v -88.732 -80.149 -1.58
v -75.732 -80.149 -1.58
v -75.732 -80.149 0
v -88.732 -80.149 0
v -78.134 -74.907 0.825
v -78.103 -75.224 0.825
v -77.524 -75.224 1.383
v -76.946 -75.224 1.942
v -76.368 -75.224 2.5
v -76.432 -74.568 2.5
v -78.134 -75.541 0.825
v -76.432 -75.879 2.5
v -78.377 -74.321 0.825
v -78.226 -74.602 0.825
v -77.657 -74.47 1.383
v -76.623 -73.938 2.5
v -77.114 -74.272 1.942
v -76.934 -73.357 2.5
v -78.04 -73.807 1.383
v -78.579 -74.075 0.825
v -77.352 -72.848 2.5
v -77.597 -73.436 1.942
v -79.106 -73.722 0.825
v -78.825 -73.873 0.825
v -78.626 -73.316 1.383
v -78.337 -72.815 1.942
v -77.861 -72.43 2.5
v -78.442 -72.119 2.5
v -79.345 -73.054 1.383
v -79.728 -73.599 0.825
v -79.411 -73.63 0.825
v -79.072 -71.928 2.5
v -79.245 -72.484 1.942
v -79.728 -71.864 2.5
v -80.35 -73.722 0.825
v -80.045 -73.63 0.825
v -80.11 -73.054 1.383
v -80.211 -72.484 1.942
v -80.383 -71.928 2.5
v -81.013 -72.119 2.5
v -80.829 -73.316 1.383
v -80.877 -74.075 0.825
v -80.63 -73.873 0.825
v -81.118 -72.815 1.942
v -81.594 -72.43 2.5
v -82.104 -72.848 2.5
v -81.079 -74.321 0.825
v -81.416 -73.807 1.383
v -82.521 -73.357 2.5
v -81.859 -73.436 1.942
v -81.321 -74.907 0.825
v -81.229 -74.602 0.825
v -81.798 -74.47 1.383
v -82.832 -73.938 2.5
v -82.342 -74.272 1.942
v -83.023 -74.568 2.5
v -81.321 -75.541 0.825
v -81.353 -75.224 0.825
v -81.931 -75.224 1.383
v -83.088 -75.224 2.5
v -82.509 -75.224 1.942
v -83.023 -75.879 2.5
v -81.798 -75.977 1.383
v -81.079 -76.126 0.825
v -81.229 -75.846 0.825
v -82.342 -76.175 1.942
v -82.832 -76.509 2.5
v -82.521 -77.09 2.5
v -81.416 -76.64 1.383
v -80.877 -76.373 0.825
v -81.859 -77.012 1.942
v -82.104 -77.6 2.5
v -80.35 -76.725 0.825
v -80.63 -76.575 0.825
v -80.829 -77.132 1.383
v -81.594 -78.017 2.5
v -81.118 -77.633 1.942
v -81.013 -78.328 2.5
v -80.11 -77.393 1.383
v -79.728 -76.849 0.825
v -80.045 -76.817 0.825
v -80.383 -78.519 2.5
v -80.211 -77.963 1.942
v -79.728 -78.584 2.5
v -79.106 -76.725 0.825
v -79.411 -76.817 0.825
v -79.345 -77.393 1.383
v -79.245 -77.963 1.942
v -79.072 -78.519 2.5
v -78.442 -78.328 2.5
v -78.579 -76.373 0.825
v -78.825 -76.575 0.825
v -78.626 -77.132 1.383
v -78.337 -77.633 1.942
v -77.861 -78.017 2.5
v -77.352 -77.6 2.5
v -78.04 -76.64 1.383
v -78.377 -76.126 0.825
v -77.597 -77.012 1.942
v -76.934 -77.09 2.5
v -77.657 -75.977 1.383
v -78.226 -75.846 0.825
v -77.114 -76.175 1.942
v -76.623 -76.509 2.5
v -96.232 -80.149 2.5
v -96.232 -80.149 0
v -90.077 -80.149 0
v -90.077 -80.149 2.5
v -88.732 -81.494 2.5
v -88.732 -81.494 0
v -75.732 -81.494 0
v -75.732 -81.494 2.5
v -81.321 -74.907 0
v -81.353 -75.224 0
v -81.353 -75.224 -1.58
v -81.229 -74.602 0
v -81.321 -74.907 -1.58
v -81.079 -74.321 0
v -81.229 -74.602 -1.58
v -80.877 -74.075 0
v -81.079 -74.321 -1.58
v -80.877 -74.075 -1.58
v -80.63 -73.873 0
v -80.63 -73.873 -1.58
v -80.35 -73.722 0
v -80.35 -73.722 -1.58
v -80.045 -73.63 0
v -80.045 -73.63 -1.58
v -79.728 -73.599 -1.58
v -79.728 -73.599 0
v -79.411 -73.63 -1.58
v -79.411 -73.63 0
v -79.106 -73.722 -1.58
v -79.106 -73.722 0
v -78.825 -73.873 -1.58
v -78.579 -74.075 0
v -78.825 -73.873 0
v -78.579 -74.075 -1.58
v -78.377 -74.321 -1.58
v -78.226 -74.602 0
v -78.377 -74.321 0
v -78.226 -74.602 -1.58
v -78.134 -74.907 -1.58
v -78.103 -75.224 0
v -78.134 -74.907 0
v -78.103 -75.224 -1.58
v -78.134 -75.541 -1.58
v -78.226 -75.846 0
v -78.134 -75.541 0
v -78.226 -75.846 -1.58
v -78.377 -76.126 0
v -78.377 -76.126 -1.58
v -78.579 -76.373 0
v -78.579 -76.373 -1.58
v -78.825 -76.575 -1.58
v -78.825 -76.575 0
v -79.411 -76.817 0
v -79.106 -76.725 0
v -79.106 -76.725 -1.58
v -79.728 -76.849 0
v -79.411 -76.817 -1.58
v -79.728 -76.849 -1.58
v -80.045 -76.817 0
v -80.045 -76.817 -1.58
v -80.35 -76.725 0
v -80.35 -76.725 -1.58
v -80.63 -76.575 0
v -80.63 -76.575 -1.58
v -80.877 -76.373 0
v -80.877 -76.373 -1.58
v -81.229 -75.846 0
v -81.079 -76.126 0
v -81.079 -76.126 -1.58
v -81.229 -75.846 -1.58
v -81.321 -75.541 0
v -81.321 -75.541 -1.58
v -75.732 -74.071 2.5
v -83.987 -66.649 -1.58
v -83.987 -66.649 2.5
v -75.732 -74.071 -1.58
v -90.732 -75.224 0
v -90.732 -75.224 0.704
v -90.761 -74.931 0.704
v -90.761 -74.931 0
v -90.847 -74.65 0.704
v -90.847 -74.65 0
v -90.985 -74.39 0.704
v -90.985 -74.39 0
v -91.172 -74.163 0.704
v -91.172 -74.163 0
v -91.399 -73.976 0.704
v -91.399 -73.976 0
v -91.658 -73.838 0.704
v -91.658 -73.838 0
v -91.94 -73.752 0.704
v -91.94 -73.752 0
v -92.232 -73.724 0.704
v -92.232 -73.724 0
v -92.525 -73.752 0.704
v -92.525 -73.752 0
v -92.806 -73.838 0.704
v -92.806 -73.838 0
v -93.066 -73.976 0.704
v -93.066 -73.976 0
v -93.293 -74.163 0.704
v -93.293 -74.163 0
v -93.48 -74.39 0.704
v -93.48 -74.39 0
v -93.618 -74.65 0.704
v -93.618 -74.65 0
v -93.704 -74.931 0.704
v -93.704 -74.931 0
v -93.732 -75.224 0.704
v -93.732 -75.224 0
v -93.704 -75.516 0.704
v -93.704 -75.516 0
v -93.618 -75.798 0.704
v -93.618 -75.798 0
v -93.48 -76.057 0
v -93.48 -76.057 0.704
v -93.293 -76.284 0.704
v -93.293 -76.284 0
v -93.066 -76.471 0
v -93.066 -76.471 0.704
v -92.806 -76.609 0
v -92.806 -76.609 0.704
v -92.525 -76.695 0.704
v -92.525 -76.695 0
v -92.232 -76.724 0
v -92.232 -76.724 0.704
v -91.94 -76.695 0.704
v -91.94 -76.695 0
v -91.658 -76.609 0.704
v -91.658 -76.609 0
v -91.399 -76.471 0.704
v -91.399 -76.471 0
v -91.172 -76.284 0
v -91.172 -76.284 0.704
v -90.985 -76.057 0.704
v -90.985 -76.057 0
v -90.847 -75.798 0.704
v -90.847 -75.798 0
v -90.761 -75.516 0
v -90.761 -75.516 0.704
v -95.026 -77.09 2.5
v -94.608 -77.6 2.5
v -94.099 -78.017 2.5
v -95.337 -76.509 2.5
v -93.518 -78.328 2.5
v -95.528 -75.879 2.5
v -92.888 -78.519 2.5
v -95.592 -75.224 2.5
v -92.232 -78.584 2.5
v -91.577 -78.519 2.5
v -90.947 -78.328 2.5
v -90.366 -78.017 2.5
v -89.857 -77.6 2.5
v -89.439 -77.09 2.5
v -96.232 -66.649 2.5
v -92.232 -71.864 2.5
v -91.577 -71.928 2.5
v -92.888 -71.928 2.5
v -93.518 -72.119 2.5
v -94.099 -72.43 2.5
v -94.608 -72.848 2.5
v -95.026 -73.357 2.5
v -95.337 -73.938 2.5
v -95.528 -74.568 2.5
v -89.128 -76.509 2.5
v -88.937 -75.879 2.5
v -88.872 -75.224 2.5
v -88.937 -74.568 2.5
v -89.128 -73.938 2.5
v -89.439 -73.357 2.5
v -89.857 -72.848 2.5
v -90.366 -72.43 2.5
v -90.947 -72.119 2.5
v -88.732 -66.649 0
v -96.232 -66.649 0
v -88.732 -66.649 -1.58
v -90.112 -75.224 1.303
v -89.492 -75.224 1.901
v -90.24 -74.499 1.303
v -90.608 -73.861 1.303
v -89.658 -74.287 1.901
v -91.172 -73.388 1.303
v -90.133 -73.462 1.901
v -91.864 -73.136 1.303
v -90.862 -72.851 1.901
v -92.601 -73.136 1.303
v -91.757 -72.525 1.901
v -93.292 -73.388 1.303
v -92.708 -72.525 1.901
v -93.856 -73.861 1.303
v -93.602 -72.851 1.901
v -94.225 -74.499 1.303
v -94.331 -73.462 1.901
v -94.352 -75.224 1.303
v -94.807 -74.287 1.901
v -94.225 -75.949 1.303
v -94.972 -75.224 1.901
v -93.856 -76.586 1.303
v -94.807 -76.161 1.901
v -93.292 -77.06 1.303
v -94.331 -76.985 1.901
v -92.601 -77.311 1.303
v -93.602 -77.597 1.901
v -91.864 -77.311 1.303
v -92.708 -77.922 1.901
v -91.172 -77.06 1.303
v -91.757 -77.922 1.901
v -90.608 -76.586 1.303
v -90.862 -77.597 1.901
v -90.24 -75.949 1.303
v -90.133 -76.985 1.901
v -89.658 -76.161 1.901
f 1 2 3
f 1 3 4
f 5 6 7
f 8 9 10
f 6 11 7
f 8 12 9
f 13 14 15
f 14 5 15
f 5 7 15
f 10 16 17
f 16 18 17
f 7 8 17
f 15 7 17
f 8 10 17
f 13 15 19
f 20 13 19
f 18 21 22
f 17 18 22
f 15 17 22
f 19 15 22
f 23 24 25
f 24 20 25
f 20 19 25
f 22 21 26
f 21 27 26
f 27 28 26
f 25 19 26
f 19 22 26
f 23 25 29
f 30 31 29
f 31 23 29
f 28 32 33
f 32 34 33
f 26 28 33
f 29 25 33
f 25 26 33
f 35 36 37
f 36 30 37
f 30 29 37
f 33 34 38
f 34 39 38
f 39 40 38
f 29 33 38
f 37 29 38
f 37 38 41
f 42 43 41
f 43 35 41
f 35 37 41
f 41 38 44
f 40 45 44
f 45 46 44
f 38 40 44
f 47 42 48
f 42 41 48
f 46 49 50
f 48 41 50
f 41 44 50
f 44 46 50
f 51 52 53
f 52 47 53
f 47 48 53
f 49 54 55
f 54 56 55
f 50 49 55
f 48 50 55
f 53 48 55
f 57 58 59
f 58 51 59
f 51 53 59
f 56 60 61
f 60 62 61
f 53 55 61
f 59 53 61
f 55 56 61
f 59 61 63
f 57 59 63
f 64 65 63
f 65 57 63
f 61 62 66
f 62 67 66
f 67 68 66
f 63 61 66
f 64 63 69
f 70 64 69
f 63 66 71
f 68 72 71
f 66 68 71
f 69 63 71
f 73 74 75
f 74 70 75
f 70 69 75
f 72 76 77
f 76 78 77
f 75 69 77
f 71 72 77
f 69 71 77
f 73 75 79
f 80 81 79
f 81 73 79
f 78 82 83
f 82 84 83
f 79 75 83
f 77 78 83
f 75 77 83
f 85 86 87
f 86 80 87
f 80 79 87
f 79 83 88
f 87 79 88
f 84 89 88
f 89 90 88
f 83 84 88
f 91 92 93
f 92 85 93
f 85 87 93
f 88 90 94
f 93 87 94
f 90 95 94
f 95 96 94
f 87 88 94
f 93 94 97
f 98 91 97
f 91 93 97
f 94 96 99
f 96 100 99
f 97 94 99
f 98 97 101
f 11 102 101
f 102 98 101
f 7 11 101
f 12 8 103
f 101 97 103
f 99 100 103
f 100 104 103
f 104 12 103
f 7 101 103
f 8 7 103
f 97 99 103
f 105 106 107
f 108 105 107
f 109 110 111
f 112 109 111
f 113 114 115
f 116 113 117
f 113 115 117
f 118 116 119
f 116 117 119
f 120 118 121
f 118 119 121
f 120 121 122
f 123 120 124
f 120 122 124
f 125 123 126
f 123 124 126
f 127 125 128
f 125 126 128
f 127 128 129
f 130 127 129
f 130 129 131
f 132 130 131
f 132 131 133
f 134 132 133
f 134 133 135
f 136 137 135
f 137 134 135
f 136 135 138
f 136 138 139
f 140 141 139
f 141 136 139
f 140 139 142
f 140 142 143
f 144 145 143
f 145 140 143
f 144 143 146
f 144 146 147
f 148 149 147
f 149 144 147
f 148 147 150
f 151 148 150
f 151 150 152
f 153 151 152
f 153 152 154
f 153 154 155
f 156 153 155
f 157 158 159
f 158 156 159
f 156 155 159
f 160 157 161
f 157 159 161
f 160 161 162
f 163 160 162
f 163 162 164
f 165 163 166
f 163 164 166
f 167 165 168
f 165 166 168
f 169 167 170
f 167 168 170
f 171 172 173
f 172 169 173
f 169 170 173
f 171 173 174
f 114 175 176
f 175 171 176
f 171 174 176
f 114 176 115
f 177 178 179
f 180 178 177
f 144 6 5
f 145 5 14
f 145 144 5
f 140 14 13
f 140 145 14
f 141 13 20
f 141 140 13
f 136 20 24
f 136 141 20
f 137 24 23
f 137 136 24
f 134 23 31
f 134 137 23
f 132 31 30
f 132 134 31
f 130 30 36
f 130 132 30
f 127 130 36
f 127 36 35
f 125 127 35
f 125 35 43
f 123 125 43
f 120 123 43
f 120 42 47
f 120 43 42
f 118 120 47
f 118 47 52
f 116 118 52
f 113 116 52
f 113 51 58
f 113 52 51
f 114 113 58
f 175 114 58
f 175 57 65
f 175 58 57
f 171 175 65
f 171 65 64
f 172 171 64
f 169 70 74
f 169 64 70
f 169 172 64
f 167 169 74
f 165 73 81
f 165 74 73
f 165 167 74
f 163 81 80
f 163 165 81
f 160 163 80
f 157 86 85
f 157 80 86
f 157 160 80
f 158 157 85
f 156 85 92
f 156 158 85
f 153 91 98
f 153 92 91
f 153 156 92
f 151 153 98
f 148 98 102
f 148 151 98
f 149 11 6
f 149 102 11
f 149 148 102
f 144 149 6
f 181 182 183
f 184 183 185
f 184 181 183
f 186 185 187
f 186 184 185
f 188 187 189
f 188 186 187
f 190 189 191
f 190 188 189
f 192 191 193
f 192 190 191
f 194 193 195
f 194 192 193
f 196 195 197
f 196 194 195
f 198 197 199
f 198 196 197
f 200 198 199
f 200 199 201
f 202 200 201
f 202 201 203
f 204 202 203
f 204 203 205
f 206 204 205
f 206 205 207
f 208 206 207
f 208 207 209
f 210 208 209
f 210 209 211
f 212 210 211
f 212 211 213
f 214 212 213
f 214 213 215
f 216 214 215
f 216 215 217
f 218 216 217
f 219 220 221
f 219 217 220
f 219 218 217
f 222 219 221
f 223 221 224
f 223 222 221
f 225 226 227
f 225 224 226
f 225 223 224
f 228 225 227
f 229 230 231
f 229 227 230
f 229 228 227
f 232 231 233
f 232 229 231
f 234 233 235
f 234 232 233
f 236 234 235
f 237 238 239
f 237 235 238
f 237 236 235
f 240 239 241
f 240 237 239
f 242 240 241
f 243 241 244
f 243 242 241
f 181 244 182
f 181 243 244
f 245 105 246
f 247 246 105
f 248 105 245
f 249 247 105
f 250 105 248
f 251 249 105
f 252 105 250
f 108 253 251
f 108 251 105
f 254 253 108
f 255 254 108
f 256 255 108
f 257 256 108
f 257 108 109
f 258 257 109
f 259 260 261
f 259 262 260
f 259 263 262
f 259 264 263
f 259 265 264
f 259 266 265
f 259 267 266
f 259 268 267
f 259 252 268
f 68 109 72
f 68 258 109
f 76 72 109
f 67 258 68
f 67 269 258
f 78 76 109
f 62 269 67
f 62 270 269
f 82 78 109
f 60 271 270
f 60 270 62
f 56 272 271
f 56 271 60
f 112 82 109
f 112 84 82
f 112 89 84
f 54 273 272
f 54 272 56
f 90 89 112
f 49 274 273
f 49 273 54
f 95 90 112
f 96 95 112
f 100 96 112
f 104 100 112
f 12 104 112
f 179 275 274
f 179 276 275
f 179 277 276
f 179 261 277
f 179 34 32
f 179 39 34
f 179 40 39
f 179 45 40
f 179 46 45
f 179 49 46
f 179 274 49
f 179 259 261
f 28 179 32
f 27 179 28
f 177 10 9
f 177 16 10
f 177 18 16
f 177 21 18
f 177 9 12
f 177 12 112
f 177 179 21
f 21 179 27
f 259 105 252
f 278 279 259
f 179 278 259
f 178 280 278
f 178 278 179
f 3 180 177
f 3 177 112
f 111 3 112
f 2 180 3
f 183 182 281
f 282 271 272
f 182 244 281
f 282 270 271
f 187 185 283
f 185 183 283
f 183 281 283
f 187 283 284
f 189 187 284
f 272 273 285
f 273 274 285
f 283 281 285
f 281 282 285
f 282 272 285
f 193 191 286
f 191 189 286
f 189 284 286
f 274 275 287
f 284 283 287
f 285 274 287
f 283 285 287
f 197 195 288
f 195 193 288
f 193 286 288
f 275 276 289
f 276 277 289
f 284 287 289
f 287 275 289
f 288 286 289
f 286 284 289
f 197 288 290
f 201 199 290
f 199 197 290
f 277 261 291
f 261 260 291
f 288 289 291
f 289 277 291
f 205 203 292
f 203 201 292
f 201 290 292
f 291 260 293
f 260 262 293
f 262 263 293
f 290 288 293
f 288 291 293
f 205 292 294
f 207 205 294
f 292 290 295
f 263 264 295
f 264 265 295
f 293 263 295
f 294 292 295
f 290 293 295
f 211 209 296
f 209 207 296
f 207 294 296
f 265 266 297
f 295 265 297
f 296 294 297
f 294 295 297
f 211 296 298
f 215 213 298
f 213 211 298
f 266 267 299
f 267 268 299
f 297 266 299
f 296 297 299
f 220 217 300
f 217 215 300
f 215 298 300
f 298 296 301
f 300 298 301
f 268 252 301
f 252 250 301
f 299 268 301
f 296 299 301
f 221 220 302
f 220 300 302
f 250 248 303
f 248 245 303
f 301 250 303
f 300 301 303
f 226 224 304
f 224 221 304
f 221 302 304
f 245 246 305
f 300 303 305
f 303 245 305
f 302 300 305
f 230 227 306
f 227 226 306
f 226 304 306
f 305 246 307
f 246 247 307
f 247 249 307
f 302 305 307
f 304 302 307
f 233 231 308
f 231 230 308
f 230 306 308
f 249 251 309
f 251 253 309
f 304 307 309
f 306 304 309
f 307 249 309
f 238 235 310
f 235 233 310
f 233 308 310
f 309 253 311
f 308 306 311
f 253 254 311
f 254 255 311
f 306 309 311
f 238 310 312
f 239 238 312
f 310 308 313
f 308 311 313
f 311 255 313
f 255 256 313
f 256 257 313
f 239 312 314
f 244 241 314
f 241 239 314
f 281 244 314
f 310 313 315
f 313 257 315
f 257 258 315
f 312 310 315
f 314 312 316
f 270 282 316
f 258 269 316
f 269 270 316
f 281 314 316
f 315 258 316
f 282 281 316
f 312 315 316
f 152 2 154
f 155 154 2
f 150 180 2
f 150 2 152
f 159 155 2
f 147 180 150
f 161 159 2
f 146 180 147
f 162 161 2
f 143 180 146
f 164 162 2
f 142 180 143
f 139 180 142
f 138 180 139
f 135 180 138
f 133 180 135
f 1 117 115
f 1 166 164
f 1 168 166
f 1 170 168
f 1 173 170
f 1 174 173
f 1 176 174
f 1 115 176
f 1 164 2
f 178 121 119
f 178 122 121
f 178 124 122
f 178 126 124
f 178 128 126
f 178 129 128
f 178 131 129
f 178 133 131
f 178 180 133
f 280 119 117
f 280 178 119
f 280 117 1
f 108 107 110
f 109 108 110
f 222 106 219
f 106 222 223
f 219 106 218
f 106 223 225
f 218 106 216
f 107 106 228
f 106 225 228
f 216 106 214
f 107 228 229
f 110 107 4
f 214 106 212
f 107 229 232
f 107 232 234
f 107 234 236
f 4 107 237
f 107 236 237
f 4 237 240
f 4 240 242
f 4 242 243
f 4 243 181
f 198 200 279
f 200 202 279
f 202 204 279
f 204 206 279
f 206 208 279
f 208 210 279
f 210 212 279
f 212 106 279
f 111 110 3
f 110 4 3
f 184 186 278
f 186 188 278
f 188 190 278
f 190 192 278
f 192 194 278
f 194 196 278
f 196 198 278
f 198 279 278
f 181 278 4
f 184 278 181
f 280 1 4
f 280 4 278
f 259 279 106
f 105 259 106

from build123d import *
from build123d.topology import SkipClean

# Parameters (mm, degrees)
CROQUIS1_R                      = 1.5
CROQUIS1_R_2                    = 1.625
SALIENTE_EXTRUIR1_DEPTH         = 2.5
SALIENTE_EXTRUIR2_START         = 1.58
CROQUIS2_R                      = 1.625
SALIENTE_EXTRUIR2_DEPTH         = 1.58
CROQUIS3_R                      = 3.35997123
CORTAR_EXTRUIR1_DEPTH           = 1.8
CORTAR_EXTRUIR1_DRAFT           = -46
CORTAR_EXTRUIR1_PROFILE_2_DEPTH = 1.8
CORTAR_EXTRUIR1_PROFILE_2_DRAFT = -46


with BuildPart() as part:
    # Croquis1 → Saliente-Extruir1 (new body)
    with BuildSketch(Plane.XY):
        Polygon((-90.077371, -80.148646), (-88.732371, -81.493646), (-75.732371, -81.493646), (-75.732371, -74.071146), (-83.98707047, -66.648646), (-88.732371, -66.648646), (-96.232371, -66.648646), (-96.232371, -80.148646), align=None)
        with Locations((-92.232371, -75.223646)):
            Circle(CROQUIS1_R, mode=Mode.SUBTRACT)
        with Locations((-79.72767153, -75.223646)):
            Circle(CROQUIS1_R_2, mode=Mode.SUBTRACT)
    extrude(amount=SALIENTE_EXTRUIR1_DEPTH)

    # Croquis2 → Saliente-Extruir2 (add)
    with SkipClean():  # the faces are left unmerged after this step: merging them gives an invalid solid
        with BuildSketch(Plane(origin=(0, 0, 0), x_dir=(-1, 0, 0), z_dir=(0, 0, -1)).offset(SALIENTE_EXTRUIR2_START)):
            Polygon((75.732371, -74.071146), (75.732371, -80.148646), (88.732371, -80.148646), (88.732371, -66.648646), (83.98707047, -66.648646), align=None)
            with Locations((79.72767153, -75.223646)):
                Circle(CROQUIS2_R, mode=Mode.SUBTRACT)
        extrude(amount=-SALIENTE_EXTRUIR2_DEPTH)


with BuildPart() as cortar_extruir1_tool:
    # Croquis3 → Cortar-Extruir1 (with draft: the straight prism first)
    with BuildSketch(Plane.XY.offset(2.5)):
        with Locations((-92.232371, -75.223646)):
            Circle(CROQUIS3_R)
    extrude(amount=-CORTAR_EXTRUIR1_DEPTH)
    # Cortar-Extruir1: the draft: its side faces are tilted about the plane it starts from
    cortar_extruir1_sides = [cortar_extruir1_tool.faces().sort_by_distance(p)[0] for p in [
        (-95.59234223, -75.223646, 1.6),
    ]]
    draft(cortar_extruir1_sides, Plane.XY.offset(2.5), CORTAR_EXTRUIR1_DRAFT)


with BuildPart() as part_1:
    add(part.part)

    # Cortar-Extruir1: cut by cortar_extruir1_tool
    add(cortar_extruir1_tool.part, mode=Mode.SUBTRACT)


with BuildPart() as cortar_extruir1_profile_2_tool:
    # Croquis3 → Cortar-Extruir1 profile 2 (with draft: the straight prism first)
    with BuildSketch(Plane.XY.offset(2.5)):
        with Locations((-79.72767153, -75.223646)):
            Circle(CROQUIS3_R)
    extrude(amount=-CORTAR_EXTRUIR1_PROFILE_2_DEPTH)
    # Cortar-Extruir1 profile 2: the draft: its side faces are tilted about the plane it starts from
    cortar_extruir1_profile_2_sides = [cortar_extruir1_profile_2_tool.faces().sort_by_distance(p)[0] for p in [
        (-83.08764276, -75.223646, 1.6),
    ]]
    draft(cortar_extruir1_profile_2_sides, Plane.XY.offset(2.5), CORTAR_EXTRUIR1_PROFILE_2_DRAFT)


with BuildPart() as part_2:
    add(part_1.part)

    # Cortar-Extruir1 profile 2: cut by cortar_extruir1_profile_2_tool
    add(cortar_extruir1_profile_2_tool.part, mode=Mode.SUBTRACT)


solid = part_2.part
